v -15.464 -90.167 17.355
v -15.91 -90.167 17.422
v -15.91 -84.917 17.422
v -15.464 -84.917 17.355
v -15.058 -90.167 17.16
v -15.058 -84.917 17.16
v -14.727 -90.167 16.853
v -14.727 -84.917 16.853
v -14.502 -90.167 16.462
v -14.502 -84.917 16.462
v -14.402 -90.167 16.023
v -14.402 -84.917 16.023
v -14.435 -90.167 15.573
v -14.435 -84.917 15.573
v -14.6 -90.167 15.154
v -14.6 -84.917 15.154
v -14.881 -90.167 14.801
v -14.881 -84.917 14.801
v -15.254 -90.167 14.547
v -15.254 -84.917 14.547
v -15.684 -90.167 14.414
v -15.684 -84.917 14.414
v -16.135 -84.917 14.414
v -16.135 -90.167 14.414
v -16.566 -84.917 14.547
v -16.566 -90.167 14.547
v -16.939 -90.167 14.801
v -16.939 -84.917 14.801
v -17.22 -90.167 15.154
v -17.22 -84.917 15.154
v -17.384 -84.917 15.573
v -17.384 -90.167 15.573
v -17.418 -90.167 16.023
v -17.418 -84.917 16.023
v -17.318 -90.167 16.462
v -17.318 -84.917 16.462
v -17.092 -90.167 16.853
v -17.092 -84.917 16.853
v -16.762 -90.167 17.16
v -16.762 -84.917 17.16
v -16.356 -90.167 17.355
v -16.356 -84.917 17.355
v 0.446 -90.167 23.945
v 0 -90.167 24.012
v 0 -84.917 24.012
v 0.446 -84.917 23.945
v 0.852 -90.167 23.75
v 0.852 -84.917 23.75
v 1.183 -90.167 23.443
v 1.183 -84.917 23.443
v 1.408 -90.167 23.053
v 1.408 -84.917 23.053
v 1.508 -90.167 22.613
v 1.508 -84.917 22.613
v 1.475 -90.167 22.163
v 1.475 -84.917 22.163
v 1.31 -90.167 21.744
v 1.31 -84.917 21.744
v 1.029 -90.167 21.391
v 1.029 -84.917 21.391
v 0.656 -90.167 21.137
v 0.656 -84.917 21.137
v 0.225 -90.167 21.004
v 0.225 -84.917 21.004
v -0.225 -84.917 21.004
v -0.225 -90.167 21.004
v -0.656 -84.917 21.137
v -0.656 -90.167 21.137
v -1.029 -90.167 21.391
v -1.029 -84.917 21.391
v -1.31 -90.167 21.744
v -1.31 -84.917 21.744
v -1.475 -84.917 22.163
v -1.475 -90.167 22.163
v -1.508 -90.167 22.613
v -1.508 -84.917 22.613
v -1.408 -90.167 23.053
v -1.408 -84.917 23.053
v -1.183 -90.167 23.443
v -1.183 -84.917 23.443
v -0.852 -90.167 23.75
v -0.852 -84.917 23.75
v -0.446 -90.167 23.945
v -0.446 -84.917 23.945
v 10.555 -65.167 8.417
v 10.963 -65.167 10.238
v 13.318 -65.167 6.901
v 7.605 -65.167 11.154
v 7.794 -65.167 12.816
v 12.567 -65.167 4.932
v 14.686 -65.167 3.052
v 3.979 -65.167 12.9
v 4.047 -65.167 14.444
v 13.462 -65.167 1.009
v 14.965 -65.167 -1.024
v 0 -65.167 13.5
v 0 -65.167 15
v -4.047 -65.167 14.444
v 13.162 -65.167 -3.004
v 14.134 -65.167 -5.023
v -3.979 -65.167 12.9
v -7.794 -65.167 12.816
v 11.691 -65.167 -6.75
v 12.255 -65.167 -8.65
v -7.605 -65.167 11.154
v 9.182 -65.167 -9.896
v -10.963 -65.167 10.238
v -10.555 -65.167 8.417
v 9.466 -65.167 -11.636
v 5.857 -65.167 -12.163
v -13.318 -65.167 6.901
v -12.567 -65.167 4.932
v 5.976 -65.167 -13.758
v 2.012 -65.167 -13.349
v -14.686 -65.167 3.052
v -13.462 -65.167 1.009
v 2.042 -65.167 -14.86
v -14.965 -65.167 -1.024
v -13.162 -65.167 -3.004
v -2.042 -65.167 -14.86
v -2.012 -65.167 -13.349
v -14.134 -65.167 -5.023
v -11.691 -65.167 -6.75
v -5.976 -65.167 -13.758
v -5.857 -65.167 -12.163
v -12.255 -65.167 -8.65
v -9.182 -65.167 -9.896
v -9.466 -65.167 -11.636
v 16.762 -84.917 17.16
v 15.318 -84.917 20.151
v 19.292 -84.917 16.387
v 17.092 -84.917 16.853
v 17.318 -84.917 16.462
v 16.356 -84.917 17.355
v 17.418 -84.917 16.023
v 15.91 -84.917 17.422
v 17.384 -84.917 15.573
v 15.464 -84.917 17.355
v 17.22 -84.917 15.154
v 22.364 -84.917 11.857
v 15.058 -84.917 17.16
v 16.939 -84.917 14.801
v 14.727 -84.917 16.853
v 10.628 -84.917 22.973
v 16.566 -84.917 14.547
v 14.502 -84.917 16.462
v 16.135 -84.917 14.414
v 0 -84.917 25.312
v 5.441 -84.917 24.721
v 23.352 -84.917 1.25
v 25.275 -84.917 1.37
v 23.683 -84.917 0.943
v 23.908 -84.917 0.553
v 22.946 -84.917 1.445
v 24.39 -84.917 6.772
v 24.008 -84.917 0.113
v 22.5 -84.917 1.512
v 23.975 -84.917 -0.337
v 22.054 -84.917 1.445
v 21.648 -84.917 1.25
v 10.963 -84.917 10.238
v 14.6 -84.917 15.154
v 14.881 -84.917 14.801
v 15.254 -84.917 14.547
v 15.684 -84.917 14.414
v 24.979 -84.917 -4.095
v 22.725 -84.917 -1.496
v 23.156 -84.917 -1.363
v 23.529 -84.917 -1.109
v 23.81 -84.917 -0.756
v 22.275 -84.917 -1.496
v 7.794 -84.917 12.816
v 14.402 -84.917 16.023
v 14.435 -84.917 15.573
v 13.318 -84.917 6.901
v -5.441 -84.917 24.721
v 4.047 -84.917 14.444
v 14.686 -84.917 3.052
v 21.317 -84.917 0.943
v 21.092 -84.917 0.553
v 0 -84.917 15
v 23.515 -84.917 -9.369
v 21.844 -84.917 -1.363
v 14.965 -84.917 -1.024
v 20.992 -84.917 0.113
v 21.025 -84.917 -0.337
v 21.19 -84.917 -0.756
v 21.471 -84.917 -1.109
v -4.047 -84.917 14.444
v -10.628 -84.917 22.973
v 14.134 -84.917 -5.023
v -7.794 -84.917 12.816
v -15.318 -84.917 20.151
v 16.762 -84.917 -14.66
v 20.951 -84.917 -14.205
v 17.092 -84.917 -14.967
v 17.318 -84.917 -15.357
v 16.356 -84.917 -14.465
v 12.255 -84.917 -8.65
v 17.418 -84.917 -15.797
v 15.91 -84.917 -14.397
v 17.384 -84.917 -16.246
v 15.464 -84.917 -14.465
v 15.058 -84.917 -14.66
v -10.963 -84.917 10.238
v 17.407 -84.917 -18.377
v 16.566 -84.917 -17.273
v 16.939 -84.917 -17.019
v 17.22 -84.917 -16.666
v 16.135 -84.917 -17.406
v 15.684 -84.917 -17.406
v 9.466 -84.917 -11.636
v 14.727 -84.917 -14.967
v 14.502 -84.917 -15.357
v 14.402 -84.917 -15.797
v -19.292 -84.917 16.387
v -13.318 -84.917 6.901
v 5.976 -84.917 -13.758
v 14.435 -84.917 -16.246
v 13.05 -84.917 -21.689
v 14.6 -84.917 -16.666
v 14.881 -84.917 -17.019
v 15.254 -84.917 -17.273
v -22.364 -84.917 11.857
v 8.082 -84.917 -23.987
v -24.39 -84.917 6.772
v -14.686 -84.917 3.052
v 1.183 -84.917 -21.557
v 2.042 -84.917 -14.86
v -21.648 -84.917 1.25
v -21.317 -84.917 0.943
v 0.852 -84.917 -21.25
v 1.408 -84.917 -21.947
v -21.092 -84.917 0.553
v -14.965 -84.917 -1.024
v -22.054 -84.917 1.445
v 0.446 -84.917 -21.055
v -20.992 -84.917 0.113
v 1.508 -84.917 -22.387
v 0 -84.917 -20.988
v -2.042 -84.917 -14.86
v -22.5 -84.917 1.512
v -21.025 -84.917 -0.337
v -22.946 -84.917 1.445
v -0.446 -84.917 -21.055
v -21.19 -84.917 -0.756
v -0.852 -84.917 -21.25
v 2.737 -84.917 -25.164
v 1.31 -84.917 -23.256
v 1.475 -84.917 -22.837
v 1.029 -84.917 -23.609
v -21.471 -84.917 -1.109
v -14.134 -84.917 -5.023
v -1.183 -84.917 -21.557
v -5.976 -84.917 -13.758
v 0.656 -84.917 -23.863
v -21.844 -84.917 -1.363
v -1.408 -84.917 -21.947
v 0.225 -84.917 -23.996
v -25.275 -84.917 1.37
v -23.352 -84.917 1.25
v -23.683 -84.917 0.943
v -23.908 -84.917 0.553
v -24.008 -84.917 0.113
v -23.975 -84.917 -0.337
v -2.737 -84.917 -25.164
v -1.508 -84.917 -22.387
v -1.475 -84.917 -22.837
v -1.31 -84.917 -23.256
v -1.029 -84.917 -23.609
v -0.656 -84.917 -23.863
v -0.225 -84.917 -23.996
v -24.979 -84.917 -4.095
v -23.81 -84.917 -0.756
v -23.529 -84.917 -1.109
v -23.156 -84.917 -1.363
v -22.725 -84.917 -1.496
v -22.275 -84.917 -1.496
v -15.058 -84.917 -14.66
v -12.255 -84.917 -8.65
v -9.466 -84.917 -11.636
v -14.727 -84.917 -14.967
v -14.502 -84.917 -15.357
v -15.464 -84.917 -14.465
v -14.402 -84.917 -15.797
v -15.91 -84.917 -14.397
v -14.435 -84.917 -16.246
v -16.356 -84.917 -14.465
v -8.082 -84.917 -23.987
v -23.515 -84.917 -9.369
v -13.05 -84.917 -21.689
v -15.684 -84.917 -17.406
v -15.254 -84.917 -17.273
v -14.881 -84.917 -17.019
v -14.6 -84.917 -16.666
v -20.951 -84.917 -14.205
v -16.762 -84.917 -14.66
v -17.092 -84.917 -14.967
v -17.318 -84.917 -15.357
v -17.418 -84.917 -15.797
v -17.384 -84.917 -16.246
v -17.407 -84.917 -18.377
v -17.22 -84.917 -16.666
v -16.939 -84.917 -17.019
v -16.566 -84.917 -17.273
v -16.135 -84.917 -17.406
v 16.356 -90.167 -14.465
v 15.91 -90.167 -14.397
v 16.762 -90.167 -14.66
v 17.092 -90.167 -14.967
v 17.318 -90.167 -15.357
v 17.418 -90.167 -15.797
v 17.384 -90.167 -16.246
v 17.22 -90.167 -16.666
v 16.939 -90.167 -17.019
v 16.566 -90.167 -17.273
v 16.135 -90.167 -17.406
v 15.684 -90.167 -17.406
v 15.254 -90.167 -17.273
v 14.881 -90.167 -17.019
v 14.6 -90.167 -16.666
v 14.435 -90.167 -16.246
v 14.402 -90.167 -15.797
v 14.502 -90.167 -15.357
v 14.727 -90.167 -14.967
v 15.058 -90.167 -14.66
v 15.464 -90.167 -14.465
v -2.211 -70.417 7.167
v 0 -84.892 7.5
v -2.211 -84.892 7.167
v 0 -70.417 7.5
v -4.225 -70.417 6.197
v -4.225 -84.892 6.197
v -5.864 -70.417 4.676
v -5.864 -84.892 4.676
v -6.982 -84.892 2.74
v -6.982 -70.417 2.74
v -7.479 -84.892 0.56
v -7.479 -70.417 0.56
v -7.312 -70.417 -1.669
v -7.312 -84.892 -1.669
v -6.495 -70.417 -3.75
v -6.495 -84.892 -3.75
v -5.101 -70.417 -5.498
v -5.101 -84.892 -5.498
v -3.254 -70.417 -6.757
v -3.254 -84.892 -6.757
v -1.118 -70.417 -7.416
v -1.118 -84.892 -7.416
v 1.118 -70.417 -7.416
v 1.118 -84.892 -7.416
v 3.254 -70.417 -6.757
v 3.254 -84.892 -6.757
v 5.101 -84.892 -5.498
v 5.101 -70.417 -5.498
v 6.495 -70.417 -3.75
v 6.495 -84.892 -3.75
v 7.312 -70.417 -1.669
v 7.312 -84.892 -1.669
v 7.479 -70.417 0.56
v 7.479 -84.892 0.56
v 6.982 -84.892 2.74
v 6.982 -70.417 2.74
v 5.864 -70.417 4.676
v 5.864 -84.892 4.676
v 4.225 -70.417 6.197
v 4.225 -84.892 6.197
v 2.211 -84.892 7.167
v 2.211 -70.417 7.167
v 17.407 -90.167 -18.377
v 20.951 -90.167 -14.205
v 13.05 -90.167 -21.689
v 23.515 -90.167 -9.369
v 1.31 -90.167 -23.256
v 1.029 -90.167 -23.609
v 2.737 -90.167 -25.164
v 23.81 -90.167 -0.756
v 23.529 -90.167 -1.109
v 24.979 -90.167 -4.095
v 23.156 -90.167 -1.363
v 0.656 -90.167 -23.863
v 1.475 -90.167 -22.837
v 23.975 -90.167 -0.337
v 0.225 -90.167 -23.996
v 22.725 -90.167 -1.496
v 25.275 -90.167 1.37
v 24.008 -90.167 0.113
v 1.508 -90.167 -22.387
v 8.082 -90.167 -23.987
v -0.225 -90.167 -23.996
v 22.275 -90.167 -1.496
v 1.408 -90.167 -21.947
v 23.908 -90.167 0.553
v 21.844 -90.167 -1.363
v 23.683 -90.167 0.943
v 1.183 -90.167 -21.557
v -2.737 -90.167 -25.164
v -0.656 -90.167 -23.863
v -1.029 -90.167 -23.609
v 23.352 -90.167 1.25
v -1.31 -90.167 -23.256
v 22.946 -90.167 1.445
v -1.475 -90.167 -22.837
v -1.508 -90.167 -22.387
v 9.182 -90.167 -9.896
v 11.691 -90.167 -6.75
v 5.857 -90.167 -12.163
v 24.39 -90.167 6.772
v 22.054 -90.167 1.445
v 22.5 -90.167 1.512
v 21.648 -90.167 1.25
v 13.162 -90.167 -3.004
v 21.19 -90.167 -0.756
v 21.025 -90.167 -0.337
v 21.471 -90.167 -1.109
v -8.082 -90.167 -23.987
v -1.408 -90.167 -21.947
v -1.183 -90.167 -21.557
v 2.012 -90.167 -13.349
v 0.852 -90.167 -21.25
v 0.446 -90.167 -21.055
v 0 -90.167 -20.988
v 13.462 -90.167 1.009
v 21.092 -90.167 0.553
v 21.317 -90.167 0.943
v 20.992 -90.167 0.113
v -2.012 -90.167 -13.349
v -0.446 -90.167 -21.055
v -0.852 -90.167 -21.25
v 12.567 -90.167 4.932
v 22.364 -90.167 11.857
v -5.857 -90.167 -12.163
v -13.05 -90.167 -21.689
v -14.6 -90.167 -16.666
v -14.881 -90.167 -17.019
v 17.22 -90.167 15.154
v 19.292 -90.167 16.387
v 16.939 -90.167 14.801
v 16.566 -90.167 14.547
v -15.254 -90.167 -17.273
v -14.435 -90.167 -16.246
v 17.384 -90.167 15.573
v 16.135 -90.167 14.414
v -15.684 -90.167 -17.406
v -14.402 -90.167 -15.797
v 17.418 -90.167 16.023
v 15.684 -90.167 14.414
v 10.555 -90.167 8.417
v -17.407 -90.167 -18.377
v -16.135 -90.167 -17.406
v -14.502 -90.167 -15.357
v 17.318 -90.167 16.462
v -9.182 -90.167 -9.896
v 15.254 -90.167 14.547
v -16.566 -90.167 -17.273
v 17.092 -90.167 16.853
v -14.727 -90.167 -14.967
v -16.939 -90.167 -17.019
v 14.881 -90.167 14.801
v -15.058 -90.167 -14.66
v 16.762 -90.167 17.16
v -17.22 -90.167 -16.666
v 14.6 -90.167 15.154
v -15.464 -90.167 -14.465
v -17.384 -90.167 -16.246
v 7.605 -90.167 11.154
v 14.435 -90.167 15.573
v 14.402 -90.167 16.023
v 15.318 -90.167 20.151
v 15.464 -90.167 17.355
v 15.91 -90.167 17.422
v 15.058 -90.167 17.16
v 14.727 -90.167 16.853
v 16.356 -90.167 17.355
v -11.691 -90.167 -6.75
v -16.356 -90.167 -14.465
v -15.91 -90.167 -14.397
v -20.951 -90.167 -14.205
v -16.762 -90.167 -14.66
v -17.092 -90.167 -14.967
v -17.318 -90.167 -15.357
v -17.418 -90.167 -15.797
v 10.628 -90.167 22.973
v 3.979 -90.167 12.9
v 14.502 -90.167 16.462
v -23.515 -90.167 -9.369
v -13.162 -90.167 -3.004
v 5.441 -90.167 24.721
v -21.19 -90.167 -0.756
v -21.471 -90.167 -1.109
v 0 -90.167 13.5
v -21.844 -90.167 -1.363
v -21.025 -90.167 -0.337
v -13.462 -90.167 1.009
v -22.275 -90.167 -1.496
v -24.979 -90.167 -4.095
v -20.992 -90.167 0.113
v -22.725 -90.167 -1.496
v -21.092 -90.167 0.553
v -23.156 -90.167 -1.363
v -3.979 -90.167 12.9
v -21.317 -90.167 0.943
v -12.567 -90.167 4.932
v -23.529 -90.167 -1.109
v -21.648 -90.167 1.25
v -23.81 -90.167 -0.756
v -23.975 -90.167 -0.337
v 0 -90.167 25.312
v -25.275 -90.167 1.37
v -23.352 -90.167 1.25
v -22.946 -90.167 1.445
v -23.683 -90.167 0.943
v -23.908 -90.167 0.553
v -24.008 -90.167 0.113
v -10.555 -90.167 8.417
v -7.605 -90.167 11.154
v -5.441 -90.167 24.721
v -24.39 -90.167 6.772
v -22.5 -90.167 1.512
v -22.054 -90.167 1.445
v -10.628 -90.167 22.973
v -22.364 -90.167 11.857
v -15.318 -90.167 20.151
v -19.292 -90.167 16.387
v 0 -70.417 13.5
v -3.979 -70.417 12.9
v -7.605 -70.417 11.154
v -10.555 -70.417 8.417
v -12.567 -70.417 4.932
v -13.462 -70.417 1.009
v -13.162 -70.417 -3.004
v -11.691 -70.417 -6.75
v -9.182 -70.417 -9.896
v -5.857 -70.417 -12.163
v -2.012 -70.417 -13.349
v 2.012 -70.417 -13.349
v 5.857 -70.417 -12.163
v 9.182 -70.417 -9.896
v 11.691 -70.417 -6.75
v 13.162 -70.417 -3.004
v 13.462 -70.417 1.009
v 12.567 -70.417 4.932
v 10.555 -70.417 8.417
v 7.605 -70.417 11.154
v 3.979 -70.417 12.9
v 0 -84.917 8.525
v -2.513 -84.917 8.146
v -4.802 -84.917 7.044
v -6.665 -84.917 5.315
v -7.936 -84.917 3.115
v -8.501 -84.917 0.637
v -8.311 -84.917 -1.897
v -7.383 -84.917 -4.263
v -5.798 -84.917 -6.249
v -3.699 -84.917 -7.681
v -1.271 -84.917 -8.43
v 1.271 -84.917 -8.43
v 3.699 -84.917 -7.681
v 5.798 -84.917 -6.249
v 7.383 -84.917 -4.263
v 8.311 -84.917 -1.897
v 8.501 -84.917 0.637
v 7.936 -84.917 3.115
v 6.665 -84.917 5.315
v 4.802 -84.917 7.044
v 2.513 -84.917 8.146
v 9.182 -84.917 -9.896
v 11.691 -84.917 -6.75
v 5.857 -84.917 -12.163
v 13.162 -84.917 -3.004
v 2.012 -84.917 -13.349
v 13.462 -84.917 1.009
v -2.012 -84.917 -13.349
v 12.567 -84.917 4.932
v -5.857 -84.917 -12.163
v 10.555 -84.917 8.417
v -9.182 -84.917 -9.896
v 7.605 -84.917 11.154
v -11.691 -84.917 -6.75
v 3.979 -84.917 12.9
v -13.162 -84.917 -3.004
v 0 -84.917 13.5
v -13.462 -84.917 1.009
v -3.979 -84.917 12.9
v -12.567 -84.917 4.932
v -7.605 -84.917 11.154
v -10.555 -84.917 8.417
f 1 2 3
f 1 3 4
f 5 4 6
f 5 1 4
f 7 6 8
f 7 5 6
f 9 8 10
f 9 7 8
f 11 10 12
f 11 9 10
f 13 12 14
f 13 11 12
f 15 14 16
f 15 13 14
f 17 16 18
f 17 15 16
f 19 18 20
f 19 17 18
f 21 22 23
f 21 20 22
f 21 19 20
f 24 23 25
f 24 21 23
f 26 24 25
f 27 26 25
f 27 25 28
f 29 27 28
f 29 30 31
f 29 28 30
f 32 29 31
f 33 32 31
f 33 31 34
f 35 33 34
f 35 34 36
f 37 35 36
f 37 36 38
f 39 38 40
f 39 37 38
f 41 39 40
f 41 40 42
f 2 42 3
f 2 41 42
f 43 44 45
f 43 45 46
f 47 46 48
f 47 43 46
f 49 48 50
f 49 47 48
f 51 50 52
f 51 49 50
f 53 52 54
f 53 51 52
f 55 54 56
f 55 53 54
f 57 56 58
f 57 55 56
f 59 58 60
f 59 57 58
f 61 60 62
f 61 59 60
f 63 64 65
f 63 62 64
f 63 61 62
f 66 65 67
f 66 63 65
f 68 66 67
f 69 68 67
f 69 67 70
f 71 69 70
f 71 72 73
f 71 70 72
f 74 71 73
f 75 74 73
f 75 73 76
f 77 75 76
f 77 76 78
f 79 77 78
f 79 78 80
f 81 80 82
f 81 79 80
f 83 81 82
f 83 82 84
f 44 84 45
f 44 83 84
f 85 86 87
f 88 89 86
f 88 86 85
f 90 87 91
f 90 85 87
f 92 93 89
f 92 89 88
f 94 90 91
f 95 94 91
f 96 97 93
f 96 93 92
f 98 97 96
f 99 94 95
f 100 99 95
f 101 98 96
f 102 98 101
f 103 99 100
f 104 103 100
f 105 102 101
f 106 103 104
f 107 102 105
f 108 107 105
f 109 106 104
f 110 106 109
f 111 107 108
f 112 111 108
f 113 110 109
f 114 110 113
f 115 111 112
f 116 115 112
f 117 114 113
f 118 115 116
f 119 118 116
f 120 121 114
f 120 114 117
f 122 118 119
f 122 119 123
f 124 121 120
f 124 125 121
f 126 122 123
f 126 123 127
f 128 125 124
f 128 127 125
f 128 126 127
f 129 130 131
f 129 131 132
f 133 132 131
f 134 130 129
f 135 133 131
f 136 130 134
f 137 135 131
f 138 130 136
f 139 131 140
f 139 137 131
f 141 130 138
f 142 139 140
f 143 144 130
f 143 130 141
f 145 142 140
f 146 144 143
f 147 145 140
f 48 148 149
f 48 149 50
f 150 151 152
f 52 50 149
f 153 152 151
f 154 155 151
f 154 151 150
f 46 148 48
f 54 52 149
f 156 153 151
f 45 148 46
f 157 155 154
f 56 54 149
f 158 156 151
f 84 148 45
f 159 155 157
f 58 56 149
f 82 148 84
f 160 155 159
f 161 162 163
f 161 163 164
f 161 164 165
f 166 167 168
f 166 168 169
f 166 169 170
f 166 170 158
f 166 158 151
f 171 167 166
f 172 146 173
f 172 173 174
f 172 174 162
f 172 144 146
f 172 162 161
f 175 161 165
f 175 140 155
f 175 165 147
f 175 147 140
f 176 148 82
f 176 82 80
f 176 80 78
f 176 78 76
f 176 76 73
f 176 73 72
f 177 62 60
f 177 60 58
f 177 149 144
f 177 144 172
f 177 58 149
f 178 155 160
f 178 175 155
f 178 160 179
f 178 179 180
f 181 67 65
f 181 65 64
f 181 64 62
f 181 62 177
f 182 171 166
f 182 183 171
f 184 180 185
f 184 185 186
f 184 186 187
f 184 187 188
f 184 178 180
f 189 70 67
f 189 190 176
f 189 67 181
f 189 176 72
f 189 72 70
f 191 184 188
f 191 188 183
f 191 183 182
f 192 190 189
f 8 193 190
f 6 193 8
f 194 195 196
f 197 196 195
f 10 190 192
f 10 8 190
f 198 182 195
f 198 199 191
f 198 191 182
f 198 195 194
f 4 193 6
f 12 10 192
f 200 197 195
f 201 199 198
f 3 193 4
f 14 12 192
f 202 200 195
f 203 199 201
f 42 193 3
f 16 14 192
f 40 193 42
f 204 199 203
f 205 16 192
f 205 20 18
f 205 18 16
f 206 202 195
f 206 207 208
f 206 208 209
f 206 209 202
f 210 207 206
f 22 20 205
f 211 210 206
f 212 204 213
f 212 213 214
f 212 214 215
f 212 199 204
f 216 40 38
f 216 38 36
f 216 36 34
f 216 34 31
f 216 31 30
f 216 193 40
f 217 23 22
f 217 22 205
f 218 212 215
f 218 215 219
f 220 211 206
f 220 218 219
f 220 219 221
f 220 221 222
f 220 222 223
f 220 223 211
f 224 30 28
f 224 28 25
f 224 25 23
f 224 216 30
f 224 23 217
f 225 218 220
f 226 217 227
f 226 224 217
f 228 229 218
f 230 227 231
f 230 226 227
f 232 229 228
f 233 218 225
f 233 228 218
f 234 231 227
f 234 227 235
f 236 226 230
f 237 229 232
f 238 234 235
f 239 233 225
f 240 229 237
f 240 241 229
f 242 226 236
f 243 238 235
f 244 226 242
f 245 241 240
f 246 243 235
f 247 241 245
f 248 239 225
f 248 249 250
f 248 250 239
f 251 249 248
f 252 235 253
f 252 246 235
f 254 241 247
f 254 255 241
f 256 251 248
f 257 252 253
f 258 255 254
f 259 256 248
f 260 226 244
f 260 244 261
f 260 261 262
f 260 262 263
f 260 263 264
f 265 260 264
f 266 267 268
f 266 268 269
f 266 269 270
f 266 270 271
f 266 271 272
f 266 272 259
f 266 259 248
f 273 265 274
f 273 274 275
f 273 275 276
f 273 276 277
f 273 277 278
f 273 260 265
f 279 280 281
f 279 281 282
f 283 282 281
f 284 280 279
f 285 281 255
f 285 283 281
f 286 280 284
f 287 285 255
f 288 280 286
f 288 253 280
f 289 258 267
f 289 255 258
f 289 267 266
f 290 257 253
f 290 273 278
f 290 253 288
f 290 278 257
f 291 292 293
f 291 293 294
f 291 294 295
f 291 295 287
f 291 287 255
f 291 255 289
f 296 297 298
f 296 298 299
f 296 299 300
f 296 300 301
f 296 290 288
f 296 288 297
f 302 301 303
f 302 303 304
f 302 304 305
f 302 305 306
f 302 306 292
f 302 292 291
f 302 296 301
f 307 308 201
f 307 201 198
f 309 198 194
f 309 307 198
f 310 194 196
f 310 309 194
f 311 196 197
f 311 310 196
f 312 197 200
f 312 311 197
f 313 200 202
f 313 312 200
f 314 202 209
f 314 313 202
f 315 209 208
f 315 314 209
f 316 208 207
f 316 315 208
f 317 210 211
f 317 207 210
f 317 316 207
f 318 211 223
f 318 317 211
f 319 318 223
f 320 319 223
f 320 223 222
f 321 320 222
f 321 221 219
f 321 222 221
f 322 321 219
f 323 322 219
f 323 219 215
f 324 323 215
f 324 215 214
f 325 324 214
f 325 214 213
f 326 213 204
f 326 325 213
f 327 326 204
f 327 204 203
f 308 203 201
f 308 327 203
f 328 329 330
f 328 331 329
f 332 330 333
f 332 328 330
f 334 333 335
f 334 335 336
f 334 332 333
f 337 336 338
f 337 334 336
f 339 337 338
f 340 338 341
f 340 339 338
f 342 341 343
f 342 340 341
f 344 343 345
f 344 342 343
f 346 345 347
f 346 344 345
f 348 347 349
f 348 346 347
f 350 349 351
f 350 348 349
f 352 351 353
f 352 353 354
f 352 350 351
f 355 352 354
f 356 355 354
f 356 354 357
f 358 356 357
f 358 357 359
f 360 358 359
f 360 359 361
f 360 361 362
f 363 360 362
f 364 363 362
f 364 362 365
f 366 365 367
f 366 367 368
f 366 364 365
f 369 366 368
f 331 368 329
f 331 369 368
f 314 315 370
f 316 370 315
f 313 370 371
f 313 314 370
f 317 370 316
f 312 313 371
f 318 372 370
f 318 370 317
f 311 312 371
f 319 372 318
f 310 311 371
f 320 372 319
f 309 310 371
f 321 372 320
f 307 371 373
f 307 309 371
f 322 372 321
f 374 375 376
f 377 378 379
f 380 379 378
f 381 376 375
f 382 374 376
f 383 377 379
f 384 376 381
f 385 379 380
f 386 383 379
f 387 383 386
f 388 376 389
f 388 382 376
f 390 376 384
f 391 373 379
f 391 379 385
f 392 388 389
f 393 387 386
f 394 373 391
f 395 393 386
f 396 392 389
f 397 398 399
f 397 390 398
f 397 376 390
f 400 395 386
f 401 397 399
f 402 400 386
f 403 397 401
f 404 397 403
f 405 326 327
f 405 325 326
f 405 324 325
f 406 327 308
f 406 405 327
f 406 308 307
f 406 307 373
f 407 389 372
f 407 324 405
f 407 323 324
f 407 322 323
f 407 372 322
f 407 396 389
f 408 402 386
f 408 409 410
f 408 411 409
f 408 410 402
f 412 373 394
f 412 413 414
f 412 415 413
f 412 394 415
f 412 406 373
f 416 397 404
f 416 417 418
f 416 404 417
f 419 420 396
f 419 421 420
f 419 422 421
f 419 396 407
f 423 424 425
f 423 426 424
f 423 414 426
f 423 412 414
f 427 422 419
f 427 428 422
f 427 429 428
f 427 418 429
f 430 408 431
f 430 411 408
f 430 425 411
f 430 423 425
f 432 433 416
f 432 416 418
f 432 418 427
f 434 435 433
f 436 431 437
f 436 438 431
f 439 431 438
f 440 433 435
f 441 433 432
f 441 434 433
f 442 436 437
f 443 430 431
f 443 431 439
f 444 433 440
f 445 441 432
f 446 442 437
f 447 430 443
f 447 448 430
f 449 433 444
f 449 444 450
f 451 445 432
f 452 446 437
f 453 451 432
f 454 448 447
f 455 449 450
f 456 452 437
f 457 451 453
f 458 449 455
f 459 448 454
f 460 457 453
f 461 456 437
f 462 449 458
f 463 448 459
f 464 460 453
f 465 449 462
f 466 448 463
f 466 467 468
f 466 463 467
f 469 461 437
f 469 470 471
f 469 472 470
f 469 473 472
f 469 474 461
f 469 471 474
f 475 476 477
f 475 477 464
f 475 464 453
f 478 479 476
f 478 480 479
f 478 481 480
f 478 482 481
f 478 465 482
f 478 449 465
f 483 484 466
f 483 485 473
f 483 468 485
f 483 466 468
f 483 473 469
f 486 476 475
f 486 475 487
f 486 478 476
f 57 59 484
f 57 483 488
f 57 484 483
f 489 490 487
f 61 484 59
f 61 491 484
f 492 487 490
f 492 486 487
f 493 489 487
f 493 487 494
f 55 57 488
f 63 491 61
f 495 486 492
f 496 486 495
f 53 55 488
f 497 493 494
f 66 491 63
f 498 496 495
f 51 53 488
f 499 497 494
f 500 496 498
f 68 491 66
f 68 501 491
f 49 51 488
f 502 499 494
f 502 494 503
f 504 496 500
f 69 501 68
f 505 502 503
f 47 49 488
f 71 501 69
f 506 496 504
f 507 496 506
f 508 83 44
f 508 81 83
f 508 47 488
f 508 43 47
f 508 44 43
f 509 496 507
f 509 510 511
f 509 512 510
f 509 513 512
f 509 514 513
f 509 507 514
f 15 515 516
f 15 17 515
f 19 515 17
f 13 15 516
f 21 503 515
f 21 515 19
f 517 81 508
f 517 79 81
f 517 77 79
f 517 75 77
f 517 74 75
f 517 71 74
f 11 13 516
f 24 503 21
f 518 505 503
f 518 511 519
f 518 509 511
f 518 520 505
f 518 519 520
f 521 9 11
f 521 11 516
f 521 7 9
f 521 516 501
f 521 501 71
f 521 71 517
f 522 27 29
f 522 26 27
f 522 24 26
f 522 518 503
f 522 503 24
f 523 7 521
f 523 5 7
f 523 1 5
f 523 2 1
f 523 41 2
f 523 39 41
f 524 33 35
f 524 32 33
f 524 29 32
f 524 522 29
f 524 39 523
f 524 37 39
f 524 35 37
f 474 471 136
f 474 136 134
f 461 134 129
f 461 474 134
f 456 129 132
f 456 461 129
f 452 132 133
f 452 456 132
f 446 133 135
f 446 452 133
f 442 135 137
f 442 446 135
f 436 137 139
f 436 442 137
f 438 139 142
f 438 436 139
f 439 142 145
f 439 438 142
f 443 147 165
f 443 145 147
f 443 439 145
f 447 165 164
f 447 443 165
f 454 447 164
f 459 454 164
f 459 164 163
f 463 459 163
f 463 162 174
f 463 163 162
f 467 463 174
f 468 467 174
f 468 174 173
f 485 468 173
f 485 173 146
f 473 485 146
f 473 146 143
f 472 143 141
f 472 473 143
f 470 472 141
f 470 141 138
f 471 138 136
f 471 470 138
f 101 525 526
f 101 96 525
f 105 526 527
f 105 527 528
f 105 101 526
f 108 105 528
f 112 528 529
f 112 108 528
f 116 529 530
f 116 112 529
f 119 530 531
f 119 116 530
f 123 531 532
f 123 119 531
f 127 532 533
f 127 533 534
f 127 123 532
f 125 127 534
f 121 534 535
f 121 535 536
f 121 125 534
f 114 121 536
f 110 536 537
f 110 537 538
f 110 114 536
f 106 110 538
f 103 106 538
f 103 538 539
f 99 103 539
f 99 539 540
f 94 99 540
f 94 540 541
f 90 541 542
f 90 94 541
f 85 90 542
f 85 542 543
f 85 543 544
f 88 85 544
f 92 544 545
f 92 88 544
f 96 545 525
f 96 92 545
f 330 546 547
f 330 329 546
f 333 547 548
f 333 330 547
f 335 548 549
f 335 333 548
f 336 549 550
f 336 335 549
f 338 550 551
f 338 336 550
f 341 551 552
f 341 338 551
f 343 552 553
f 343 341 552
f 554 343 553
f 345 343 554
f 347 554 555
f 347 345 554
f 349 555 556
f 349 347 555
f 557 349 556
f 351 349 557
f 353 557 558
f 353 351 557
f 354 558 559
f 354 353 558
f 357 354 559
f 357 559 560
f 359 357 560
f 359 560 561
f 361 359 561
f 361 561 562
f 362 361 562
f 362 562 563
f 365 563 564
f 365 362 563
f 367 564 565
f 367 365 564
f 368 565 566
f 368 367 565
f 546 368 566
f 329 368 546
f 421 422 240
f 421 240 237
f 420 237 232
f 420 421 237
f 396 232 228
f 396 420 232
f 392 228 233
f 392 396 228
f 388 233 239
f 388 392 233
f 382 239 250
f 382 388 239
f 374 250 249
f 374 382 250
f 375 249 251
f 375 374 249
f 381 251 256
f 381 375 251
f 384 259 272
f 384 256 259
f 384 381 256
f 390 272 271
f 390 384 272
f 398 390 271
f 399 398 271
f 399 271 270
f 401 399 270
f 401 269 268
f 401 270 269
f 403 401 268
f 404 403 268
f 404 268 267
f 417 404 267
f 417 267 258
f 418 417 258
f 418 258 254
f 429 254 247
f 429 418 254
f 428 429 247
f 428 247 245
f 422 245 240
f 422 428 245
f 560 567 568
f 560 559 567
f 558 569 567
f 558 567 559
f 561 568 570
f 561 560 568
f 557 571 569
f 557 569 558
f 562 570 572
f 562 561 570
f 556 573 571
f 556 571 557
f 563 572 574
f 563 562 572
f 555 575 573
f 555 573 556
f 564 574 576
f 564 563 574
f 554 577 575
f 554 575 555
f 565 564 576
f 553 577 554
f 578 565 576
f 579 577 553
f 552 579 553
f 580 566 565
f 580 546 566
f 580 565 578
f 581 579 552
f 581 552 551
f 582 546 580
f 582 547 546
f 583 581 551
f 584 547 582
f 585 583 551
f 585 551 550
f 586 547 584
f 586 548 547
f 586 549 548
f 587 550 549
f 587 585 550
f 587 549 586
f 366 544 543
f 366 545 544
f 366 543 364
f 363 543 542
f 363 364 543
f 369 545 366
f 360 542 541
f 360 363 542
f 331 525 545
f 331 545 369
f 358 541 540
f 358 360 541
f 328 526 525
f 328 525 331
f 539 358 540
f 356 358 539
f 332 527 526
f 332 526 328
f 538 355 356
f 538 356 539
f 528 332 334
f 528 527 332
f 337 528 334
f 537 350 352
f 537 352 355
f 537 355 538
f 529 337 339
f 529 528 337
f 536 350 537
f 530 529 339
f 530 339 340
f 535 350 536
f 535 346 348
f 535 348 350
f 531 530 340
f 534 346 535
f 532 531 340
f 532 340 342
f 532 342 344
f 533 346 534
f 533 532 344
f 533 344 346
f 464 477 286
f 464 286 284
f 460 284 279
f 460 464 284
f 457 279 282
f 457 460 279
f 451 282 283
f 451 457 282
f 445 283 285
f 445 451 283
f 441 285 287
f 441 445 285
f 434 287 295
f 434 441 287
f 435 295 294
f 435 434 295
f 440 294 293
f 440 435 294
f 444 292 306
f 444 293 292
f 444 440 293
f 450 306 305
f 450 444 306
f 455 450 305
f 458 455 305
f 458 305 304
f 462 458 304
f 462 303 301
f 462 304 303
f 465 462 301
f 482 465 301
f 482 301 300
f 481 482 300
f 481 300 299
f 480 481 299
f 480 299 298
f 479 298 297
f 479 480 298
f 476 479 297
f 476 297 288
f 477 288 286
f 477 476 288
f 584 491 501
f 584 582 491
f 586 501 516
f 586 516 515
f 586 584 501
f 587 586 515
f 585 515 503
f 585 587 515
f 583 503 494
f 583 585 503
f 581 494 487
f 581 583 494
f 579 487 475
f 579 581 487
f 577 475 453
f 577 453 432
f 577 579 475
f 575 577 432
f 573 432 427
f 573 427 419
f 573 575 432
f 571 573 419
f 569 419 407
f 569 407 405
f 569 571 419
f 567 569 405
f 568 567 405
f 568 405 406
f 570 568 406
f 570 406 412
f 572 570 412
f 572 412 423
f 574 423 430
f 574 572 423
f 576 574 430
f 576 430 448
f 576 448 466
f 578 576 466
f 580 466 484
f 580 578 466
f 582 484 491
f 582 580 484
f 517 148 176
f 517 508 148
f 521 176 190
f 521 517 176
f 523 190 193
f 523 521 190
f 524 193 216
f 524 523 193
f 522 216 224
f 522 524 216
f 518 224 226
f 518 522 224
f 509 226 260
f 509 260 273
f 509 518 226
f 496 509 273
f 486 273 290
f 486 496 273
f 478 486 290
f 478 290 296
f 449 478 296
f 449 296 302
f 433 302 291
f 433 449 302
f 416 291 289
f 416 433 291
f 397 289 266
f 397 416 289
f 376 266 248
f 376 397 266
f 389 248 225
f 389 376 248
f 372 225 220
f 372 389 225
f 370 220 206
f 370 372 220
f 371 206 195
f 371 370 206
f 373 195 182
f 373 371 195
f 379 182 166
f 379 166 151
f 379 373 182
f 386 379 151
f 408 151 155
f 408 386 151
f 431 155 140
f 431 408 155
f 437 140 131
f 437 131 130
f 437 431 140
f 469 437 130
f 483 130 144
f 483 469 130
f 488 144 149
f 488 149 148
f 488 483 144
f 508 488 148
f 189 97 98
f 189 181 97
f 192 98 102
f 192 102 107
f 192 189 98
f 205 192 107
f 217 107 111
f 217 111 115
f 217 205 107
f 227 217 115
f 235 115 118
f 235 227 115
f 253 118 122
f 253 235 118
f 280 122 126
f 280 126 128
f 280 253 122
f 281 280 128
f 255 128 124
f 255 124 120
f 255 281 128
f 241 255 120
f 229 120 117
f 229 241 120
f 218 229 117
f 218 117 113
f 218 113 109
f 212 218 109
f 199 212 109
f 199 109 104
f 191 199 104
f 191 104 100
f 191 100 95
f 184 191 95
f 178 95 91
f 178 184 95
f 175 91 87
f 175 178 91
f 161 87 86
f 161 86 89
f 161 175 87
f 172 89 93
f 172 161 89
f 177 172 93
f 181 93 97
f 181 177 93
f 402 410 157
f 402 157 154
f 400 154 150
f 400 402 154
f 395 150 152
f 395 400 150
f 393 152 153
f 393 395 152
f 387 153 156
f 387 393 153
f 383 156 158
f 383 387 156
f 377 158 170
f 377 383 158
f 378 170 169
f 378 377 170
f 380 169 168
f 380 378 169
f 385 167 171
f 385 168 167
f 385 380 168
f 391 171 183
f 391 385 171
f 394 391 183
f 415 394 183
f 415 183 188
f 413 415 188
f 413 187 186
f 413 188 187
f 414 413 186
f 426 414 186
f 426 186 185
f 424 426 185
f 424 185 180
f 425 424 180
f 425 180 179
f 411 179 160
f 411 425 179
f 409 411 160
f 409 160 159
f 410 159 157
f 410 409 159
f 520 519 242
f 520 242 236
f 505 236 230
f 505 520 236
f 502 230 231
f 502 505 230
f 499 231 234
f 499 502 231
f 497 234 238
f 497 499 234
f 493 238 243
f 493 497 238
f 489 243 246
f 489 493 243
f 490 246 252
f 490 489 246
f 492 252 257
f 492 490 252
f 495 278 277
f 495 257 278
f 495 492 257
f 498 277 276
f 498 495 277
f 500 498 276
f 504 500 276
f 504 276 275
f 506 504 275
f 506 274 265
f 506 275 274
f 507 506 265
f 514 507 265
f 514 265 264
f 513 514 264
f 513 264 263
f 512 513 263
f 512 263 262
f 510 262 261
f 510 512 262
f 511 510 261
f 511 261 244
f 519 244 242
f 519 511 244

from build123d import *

# Parameters (mm, degrees)
CUT_EXTRUDE1_DEPTH      = 164.536310953
CUT_EXTRUDE1_DEPTH_BACK = 164.536310953
SKETCH2_R               = 6.05
SCALE1_SCALE            = 0.25


with BuildPart() as part:
    # Sketch1 → Revolve1 (revolve)
    with BuildSketch(Plane(origin=(0, 0, 0), x_dir=(0, 0, -1), z_dir=(1, 0, 0))):
        Polygon((-60, -15.260894059), (-60, -94.260894059), (-101.25, -94.260894059), (-101.25, -107.260894059), (-101.25, -115.260894059), (-54, -115.260894059), (-54, -94.260894059), (-34.1, -94.260894059), (-30, -94.160894059), (-30, -36.260894059), (-54, -36.260894059), (-54, -15.260894059), align=None)
    revolve(axis=Axis((0, 150, 0), (0, -1, 0)))

    # Sketch2 → Cut-Extrude1 (cut, two sides: drawn at the far end of the back side and taken through both)
    with BuildSketch(Plane(origin=(0, -94.260894059, 0), x_dir=(1, 0, 0), z_dir=(0, 1, 0)).offset(-CUT_EXTRUDE1_DEPTH_BACK)):
        with Locations(Location((0, 90, 0), (0, 0, 270))):
            Circle(SKETCH2_R)
        with Locations(Location((63.639610307, 63.639610307, 0), (0, 0, 270))):
            Circle(SKETCH2_R)
        with Locations(Location((90, 0, 0), (0, 0, 270))):
            Circle(SKETCH2_R)
        with Locations(Location((63.639610307, -63.639610307, 0), (0, 0, 270))):
            Circle(SKETCH2_R)
        with Locations(Location((0, -90, 0), (0, 0, 270))):
            Circle(SKETCH2_R)
        with Locations(Location((-63.639610307, -63.639610307, 0), (0, 0, 270))):
            Circle(SKETCH2_R)
        with Locations(Location((-90, 0, 0), (0, 0, 270))):
            Circle(SKETCH2_R)
        with Locations(Location((-63.639610307, 63.639610307, 0), (0, 0, 270))):
            Circle(SKETCH2_R)
    extrude(amount=CUT_EXTRUDE1_DEPTH + CUT_EXTRUDE1_DEPTH_BACK, mode=Mode.SUBTRACT)


with BuildPart() as part_1:
    # Scale1: scaled about (0, -81.802293933, 0)
    add(part.part.scale(SCALE1_SCALE).moved(Location((0, -61.35172045, 0))))


solid = part_1.part
